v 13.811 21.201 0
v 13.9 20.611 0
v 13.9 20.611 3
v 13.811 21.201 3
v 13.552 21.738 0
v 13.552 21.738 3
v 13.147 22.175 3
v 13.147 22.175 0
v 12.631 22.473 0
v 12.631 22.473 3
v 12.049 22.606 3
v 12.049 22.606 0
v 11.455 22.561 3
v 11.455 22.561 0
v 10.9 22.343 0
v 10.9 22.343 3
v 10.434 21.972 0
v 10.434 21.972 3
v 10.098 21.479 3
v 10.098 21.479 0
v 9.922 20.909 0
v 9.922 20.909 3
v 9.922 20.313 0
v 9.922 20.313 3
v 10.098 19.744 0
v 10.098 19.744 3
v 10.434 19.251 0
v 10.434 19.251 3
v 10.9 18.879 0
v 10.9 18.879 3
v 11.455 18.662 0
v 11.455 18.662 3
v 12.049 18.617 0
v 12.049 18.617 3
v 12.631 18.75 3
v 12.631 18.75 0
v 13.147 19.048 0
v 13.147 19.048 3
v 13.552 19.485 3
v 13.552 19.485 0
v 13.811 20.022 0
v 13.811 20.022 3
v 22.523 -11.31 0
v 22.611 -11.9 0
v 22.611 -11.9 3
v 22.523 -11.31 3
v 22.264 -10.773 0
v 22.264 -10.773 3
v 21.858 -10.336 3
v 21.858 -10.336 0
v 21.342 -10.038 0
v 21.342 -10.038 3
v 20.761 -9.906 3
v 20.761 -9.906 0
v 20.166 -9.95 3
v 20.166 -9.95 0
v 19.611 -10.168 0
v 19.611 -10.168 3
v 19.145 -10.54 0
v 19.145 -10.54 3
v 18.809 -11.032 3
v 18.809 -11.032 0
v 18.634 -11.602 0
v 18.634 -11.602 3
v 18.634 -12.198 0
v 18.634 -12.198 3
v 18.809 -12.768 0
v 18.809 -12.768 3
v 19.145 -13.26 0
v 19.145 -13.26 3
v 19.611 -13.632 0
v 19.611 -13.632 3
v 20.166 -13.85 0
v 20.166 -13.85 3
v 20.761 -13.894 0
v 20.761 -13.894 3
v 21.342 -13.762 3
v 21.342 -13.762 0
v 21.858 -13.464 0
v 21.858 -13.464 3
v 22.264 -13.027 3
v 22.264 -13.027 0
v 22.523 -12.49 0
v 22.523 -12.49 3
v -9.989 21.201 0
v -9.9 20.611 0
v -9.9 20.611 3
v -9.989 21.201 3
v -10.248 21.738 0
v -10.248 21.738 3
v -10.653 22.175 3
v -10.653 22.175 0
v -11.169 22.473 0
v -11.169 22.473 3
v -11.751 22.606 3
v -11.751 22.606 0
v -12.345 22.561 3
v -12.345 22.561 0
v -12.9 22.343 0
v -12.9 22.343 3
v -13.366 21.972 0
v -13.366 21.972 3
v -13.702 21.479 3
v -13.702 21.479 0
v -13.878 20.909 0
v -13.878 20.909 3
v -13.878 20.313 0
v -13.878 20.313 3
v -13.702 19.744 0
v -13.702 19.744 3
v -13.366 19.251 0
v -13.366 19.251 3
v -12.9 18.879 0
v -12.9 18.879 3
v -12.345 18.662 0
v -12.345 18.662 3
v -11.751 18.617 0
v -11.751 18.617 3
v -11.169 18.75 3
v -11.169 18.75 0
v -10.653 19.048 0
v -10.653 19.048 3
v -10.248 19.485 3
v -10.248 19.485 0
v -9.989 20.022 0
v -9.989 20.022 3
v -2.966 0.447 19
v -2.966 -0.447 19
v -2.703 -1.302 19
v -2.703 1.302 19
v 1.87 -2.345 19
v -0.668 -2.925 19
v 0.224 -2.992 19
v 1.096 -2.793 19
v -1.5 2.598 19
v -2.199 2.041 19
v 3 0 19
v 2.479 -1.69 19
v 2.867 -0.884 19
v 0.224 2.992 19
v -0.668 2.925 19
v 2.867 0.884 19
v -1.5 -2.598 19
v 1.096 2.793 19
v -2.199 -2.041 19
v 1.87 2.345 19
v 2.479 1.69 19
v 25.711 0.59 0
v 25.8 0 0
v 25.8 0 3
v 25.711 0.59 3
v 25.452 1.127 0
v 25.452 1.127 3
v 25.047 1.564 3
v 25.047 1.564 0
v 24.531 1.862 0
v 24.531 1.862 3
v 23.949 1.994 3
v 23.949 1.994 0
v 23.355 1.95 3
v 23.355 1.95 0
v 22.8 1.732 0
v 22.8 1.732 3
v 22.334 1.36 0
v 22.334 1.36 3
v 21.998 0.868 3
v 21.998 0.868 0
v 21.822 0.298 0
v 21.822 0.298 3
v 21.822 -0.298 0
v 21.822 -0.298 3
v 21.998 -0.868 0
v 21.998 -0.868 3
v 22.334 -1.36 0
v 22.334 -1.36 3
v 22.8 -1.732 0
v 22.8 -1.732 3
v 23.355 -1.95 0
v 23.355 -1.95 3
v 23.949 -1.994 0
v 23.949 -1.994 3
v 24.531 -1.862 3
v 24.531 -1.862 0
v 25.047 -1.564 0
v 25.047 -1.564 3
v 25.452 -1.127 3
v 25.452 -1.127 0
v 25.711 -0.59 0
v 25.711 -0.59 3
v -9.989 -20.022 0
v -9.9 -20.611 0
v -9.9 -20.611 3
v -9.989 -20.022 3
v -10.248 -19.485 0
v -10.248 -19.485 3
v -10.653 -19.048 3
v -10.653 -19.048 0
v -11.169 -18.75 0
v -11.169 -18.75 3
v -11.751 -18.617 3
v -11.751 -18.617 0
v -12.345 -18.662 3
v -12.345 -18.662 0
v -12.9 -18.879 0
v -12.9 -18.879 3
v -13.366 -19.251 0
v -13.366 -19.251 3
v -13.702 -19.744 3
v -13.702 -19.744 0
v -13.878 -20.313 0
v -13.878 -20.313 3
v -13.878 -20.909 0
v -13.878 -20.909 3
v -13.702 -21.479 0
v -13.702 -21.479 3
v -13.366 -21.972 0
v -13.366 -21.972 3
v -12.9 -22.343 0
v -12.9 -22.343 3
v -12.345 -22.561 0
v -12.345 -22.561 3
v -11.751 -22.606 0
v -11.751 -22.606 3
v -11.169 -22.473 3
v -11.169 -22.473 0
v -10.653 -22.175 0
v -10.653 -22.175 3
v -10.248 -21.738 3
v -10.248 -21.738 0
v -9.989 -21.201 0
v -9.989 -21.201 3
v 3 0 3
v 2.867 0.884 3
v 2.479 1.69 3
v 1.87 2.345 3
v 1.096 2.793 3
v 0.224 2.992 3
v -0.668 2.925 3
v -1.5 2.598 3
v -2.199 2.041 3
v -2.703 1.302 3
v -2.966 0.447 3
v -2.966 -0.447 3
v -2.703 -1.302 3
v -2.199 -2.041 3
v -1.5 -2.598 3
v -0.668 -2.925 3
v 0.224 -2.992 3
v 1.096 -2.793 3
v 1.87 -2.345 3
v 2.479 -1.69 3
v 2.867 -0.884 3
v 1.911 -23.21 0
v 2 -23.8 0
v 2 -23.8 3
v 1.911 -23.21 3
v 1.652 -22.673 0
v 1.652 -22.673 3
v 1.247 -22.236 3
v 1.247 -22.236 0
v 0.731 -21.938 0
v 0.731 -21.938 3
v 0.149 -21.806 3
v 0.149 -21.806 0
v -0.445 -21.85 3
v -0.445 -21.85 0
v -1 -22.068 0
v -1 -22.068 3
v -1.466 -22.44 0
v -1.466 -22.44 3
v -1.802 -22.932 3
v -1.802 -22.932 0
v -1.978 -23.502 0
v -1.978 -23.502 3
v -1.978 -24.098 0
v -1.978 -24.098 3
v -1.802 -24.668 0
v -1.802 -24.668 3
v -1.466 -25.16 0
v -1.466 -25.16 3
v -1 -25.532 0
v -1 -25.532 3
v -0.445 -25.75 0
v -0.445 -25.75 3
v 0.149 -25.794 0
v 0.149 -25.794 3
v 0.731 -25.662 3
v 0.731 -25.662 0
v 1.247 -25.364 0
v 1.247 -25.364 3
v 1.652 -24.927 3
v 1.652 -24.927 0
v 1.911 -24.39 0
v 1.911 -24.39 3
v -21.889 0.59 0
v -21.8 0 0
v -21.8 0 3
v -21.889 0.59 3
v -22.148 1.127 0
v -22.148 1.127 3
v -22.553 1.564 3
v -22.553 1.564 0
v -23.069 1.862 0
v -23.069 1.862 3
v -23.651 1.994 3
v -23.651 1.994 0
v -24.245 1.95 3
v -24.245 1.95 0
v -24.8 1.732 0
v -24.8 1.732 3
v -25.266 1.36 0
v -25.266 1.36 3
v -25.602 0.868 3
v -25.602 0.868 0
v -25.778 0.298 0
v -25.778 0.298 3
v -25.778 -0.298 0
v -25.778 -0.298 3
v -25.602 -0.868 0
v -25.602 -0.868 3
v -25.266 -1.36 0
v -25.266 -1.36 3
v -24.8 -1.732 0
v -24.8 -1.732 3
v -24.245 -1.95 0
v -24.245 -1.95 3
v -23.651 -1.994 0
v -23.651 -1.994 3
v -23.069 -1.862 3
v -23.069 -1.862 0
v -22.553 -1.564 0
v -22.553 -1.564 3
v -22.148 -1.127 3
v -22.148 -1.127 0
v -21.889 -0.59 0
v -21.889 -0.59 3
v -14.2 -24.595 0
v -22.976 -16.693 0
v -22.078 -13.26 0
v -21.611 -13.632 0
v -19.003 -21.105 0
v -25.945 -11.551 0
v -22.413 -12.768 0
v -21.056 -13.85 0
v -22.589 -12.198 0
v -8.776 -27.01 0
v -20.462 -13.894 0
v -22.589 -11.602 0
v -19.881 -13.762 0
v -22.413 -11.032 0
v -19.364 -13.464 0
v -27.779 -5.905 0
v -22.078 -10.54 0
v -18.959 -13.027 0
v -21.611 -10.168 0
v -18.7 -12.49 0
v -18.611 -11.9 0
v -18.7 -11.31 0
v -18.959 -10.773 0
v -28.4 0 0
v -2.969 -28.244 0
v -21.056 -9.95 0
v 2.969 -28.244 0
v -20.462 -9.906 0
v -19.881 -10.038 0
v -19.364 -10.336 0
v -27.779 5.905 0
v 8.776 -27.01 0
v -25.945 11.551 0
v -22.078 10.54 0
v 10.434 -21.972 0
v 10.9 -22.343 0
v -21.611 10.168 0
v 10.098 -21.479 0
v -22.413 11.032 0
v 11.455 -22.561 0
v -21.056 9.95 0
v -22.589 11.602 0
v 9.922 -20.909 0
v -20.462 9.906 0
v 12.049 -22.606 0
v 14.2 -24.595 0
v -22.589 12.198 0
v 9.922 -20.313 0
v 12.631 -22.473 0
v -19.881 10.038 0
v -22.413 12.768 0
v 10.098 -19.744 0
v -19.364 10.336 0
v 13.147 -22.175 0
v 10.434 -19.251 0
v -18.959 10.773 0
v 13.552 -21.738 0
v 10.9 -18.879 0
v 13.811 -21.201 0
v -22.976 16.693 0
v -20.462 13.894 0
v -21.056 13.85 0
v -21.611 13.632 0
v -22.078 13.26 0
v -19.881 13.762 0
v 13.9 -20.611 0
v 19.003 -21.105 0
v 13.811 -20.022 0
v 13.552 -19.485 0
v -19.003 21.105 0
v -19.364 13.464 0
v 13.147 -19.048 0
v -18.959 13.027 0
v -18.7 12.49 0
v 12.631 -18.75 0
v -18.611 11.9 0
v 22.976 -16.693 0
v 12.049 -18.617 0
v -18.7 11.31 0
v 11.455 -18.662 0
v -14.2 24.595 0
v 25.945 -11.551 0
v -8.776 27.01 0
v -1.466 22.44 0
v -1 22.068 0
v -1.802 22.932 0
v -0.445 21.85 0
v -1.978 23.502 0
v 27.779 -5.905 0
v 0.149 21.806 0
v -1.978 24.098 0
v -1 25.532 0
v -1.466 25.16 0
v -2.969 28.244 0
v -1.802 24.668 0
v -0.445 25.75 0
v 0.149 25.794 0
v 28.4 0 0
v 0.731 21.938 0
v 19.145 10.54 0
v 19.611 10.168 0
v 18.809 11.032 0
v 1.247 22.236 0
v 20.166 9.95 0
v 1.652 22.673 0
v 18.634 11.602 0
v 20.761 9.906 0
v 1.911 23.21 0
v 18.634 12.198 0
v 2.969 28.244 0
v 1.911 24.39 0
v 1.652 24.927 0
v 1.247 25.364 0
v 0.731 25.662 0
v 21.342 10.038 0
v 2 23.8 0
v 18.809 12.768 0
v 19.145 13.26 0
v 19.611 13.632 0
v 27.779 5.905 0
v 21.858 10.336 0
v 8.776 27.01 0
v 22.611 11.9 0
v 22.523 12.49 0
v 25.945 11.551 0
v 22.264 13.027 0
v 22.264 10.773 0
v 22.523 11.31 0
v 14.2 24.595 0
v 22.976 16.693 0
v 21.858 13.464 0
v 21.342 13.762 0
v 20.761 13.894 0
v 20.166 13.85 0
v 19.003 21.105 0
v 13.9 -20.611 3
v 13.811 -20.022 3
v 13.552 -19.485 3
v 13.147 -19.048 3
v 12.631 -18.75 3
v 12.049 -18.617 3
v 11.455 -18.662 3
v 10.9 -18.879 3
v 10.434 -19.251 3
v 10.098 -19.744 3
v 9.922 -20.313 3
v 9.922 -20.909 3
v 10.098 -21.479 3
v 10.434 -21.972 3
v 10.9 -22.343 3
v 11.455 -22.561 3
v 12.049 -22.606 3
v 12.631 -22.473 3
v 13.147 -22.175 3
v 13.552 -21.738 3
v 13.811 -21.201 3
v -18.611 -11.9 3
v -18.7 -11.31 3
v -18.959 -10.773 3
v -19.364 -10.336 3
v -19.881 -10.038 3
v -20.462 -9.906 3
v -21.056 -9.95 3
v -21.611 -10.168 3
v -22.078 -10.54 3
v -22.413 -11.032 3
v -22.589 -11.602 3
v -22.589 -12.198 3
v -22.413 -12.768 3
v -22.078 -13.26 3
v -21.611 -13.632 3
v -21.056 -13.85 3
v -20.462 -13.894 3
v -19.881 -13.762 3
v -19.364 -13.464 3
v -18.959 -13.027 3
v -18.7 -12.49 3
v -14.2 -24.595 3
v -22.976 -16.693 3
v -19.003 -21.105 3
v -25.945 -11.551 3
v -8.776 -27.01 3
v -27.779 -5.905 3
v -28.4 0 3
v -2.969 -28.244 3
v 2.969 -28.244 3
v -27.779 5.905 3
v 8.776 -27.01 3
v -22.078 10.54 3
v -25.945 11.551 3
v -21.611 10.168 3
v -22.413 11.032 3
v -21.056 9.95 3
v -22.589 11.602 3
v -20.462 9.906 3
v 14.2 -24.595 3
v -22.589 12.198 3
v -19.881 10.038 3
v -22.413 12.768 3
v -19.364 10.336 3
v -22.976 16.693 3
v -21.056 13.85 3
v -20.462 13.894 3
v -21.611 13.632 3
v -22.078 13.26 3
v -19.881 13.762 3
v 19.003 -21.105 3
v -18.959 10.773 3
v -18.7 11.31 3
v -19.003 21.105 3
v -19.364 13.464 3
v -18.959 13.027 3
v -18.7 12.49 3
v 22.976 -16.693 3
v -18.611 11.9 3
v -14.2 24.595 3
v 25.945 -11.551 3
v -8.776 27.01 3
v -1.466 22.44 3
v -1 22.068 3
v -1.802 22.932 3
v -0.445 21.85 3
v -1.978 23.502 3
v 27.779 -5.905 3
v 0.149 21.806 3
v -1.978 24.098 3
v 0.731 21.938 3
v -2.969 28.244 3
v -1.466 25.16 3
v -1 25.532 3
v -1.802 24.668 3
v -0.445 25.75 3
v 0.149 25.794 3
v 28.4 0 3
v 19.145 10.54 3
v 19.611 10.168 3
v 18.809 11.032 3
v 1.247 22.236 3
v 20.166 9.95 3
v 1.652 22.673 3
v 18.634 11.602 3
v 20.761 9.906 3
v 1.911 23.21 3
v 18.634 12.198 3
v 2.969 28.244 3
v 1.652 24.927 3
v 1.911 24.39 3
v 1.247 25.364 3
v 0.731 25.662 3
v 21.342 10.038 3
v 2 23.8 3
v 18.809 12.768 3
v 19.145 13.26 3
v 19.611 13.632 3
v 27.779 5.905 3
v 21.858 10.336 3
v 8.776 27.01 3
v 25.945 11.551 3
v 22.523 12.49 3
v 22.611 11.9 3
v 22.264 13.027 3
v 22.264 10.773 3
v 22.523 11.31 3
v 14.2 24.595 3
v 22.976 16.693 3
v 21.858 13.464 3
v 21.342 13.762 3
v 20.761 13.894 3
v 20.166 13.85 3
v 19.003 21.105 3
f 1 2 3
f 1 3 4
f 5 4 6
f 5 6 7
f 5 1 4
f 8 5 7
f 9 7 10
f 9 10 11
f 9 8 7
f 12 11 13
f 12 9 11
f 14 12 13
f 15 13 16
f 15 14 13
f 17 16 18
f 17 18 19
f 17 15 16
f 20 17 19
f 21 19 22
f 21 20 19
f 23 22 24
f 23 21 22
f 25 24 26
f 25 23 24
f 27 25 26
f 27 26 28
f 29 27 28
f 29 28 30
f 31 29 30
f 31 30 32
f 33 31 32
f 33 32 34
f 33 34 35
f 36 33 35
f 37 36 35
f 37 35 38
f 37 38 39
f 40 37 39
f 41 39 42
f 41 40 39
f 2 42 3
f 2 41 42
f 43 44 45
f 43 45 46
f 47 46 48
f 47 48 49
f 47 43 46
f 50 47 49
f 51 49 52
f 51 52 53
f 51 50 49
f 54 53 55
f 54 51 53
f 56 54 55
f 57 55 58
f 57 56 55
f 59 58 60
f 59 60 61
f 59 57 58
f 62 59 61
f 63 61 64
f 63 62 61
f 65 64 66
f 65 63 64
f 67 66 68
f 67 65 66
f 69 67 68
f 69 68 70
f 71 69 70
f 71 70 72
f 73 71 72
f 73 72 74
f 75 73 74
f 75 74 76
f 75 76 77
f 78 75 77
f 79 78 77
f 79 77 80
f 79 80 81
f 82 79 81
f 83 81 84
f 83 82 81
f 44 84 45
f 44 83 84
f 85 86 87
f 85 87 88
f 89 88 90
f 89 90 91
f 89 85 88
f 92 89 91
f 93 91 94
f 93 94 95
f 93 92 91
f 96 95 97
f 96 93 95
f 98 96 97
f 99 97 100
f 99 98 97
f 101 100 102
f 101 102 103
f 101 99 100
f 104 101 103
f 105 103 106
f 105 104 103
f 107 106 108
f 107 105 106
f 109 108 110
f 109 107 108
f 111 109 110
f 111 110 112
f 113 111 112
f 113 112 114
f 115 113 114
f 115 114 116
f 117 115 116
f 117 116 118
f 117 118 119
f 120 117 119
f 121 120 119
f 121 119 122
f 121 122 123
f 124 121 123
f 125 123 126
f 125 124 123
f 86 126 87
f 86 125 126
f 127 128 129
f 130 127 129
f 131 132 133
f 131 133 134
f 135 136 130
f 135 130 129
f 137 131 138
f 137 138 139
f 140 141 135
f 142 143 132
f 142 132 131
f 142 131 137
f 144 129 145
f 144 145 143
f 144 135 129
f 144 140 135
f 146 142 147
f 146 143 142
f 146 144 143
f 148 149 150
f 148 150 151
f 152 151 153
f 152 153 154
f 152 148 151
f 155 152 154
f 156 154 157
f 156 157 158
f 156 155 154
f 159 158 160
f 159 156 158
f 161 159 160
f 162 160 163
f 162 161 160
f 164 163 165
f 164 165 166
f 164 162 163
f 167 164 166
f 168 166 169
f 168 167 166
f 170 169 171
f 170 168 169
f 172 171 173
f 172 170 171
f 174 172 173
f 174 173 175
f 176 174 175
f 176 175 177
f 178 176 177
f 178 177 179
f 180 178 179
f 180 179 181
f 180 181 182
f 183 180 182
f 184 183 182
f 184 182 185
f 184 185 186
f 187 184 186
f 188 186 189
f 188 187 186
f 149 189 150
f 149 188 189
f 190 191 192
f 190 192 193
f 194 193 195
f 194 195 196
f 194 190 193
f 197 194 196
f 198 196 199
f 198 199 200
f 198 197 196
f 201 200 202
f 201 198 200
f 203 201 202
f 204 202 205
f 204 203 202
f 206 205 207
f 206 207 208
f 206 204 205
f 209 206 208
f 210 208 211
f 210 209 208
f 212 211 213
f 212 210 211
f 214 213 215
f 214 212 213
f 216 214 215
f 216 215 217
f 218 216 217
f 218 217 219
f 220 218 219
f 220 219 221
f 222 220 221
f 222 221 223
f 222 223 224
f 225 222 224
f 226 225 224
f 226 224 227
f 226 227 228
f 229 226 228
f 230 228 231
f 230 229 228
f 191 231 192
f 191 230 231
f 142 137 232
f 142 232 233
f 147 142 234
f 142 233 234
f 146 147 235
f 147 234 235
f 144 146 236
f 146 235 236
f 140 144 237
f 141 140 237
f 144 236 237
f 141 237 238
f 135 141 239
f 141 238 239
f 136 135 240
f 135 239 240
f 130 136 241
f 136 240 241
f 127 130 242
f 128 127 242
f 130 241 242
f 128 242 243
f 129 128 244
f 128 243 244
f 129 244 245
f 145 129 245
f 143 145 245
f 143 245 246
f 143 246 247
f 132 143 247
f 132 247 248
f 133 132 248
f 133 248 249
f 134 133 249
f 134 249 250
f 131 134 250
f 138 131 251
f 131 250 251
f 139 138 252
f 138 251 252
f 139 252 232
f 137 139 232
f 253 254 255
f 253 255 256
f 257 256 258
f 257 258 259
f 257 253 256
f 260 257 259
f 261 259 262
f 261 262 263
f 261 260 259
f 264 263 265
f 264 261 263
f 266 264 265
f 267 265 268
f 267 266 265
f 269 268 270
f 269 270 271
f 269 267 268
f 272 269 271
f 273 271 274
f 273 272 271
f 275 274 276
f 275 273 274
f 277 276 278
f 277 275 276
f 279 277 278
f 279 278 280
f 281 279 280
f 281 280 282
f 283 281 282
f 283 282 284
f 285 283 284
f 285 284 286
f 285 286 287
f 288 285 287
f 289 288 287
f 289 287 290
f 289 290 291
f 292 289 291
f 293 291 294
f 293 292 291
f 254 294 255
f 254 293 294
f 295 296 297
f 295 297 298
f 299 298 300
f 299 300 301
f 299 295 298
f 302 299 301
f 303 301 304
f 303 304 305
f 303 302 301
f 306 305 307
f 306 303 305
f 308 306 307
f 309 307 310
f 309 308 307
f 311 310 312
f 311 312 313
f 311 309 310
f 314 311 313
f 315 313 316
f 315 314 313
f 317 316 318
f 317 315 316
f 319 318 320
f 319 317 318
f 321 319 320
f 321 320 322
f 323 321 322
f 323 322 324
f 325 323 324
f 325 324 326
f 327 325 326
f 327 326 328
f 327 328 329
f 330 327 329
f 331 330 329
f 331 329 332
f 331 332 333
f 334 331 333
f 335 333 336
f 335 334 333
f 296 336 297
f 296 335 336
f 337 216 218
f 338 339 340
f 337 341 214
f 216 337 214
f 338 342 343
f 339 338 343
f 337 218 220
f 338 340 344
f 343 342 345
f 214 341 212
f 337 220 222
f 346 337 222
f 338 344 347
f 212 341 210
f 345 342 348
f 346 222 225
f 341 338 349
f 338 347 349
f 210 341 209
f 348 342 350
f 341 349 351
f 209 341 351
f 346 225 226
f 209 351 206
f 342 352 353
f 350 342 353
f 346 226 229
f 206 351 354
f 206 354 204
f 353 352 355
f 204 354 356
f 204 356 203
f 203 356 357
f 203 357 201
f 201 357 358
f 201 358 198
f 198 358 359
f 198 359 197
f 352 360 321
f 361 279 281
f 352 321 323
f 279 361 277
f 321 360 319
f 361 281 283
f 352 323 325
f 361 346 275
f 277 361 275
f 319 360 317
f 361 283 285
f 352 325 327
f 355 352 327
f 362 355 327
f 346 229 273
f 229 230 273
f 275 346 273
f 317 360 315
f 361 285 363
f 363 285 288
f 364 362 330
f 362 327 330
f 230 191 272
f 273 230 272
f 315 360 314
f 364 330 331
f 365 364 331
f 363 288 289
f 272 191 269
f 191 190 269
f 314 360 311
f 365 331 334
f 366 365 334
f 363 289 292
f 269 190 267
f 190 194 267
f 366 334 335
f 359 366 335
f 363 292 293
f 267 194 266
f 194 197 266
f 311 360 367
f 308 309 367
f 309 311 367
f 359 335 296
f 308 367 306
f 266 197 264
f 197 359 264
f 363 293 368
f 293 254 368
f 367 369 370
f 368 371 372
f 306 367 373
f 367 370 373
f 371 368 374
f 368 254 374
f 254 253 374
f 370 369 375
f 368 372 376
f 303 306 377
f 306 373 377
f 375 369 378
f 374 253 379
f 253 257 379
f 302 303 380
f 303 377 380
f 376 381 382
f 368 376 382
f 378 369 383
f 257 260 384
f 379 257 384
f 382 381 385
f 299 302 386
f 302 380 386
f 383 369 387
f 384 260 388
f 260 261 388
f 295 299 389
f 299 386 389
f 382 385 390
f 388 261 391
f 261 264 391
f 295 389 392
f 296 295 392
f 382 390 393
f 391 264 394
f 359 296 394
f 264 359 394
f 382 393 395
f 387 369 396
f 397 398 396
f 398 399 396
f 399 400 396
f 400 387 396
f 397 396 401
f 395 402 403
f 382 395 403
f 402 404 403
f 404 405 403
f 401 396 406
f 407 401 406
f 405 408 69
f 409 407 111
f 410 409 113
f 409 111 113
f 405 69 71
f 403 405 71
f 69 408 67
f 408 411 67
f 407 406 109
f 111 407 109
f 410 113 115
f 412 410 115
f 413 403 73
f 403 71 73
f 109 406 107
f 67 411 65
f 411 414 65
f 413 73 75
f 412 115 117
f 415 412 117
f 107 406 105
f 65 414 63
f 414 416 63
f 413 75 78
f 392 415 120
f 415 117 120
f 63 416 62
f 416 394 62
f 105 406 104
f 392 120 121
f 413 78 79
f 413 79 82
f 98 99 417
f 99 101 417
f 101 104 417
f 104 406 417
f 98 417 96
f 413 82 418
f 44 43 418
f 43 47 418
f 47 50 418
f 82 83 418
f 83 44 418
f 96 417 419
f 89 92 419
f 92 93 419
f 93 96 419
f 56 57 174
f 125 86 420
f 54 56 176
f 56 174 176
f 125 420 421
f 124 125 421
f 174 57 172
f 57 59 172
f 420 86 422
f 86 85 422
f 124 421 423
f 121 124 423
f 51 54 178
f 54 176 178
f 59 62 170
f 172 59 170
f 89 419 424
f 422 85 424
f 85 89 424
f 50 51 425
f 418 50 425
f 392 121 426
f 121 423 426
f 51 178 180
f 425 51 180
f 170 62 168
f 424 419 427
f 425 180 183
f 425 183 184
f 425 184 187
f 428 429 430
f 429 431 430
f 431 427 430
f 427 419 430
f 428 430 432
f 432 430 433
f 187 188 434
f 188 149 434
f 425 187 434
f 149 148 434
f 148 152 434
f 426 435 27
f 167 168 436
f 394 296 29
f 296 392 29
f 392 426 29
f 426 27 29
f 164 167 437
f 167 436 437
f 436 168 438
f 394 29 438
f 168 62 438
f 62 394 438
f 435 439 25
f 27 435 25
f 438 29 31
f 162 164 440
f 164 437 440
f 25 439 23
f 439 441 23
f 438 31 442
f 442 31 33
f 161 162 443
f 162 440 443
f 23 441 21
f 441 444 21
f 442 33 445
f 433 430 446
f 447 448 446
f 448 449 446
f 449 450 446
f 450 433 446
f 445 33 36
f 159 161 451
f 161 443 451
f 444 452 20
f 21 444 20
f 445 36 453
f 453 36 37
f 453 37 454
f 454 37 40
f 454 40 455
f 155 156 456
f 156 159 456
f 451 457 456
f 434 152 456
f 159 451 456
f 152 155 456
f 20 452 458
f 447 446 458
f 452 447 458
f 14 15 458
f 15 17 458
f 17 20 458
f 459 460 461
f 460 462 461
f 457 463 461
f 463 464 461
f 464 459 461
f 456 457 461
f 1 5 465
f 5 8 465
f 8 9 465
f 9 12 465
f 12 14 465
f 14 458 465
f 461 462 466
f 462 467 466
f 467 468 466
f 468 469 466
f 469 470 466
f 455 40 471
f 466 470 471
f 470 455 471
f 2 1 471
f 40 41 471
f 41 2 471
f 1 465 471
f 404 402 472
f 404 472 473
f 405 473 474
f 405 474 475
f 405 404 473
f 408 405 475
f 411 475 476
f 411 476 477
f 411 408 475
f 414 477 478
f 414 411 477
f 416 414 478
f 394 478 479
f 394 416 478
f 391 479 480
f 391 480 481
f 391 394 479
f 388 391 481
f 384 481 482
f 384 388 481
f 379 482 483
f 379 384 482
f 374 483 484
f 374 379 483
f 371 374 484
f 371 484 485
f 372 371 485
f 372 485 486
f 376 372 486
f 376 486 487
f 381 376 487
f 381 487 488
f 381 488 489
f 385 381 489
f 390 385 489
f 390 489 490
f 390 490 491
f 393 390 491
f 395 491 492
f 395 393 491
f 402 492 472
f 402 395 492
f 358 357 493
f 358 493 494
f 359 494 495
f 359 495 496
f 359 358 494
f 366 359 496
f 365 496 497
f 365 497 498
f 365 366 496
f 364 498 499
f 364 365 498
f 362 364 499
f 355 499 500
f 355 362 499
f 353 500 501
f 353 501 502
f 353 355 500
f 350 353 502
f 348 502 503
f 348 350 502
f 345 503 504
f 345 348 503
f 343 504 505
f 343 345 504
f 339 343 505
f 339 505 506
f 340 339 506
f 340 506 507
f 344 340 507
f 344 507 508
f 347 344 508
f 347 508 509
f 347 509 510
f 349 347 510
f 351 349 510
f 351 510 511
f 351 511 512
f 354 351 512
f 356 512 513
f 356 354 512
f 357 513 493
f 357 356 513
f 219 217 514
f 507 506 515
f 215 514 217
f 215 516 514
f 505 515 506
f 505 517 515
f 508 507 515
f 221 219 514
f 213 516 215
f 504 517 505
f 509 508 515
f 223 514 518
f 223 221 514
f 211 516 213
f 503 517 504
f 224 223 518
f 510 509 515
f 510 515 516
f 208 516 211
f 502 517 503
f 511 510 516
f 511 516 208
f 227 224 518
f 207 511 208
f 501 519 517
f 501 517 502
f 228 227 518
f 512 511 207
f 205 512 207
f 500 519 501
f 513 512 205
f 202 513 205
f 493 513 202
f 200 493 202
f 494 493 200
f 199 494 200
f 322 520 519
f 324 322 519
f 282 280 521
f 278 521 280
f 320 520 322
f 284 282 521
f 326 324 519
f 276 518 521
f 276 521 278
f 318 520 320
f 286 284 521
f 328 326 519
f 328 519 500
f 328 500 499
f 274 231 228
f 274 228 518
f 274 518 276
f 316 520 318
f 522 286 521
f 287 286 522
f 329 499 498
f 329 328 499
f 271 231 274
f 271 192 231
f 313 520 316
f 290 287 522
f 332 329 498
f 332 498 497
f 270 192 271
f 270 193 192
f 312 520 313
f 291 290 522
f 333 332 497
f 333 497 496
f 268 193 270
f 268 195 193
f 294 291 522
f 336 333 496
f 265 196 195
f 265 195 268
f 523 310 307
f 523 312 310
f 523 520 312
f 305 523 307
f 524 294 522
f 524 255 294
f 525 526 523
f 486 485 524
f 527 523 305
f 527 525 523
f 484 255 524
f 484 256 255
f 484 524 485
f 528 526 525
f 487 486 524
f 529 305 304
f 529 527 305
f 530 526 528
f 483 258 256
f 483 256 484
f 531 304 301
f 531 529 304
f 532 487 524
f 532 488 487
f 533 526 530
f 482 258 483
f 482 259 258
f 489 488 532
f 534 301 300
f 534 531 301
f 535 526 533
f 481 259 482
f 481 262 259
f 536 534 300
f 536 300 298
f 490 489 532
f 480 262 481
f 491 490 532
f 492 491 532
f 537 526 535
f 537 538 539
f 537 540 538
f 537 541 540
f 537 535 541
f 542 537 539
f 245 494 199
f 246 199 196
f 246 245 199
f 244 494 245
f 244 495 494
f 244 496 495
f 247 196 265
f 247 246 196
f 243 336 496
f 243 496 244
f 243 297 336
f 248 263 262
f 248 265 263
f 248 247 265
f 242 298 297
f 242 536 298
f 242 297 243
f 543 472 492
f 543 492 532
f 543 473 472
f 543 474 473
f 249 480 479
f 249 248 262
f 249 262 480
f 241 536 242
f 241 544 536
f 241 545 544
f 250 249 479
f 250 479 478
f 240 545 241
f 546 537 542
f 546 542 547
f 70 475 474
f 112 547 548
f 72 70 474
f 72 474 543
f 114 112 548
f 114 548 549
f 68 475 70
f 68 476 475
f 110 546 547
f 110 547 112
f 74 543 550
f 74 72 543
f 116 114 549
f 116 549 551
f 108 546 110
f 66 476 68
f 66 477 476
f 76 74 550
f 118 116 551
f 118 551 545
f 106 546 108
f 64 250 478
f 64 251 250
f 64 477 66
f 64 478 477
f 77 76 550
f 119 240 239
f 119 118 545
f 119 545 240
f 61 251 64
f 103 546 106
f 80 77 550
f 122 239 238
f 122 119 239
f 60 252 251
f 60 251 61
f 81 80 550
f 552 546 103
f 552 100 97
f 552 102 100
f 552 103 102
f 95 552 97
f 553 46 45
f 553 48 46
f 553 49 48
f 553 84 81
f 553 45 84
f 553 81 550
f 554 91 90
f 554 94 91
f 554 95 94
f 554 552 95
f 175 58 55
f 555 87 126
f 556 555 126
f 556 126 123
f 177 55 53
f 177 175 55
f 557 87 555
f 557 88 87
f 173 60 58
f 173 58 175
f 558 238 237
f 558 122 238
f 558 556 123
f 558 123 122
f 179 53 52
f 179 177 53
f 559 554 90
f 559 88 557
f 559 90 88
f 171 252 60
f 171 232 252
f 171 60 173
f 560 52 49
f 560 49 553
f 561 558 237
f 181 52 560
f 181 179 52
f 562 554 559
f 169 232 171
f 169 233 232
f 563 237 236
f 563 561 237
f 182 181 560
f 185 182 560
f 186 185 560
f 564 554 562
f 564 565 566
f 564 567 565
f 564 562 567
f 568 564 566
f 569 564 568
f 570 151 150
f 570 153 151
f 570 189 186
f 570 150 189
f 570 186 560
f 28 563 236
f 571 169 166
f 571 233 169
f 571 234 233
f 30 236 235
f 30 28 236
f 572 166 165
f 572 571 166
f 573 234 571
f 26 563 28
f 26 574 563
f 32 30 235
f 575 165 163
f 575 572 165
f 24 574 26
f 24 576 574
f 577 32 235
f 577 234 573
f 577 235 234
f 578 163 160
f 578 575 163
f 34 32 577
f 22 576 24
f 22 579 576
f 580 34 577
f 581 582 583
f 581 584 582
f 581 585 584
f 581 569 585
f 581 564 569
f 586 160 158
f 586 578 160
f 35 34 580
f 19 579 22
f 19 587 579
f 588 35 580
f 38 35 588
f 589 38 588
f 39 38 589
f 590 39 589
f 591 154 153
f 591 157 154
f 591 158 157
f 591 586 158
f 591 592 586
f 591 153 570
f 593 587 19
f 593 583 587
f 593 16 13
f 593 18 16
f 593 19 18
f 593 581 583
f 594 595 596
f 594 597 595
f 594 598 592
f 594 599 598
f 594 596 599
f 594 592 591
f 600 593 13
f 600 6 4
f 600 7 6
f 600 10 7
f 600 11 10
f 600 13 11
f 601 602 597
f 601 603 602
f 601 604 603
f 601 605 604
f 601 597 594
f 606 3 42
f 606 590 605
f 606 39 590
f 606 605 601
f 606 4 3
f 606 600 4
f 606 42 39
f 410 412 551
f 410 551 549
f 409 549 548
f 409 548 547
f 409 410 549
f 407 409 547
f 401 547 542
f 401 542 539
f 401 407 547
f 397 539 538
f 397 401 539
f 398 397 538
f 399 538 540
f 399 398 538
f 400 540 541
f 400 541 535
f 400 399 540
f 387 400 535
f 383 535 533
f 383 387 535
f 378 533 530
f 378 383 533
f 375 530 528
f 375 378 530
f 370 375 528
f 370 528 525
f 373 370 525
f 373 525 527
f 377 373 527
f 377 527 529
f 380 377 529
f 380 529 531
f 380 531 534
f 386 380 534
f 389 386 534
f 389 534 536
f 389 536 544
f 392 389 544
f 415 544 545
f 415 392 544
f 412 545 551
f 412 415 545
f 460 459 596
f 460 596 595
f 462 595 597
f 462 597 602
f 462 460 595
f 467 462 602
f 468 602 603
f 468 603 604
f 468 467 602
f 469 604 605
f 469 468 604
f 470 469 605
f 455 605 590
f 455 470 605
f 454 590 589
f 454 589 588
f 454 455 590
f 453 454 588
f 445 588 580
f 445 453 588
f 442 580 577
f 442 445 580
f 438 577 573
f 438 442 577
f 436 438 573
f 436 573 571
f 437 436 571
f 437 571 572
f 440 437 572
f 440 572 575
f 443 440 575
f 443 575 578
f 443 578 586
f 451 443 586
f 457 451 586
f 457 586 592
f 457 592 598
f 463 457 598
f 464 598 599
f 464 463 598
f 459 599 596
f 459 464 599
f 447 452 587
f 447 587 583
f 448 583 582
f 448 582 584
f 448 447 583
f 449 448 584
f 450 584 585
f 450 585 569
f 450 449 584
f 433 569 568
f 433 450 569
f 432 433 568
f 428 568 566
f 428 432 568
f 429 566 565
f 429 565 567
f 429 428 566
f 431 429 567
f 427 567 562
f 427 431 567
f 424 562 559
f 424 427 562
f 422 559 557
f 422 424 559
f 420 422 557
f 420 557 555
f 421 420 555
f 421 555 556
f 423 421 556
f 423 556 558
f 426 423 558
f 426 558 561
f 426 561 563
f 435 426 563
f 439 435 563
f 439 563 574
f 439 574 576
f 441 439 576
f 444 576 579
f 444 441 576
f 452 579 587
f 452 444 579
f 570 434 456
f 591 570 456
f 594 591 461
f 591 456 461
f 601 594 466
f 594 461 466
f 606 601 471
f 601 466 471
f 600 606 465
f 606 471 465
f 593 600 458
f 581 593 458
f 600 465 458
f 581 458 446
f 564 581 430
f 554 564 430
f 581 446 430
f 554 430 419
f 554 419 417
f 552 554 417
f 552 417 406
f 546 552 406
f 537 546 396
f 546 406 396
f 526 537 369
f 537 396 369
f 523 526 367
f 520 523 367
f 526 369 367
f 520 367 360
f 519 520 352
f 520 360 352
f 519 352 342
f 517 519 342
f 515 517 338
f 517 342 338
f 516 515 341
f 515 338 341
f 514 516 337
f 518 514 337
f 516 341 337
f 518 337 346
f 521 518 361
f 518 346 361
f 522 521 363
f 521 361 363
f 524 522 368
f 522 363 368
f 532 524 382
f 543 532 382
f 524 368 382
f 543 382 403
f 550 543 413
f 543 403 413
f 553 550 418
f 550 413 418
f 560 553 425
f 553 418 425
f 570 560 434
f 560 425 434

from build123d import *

# Parameters (mm, degrees)
SKETCH1_R           = 28.4
SKETCH1_R_2         = 2
BOSS_EXTRUDE1_DEPTH = 3
SKETCH2_R           = 3
BOSS_EXTRUDE2_DEPTH = 16


with BuildPart() as part:
    # Sketch1 → Boss-Extrude1 (new body)
    with BuildSketch(Plane.XY):
        Circle(SKETCH1_R)
        with Locations((23.8, 0)):
            Circle(SKETCH1_R_2, mode=Mode.SUBTRACT)
        with Locations((20.61140461, -11.9)):
            Circle(SKETCH1_R_2, mode=Mode.SUBTRACT)
        with Locations((11.9, -20.61140461)):
            Circle(SKETCH1_R_2, mode=Mode.SUBTRACT)
        with Locations((0, -23.8)):
            Circle(SKETCH1_R_2, mode=Mode.SUBTRACT)
        with Locations((-11.9, -20.61140461)):
            Circle(SKETCH1_R_2, mode=Mode.SUBTRACT)
        with Locations((-20.61140461, -11.9)):
            Circle(SKETCH1_R_2, mode=Mode.SUBTRACT)
        with Locations((-23.8, 0)):
            Circle(SKETCH1_R_2, mode=Mode.SUBTRACT)
        with Locations((-20.61140461, 11.9)):
            Circle(SKETCH1_R_2, mode=Mode.SUBTRACT)
        with Locations((-11.9, 20.61140461)):
            Circle(SKETCH1_R_2, mode=Mode.SUBTRACT)
        with Locations((0, 23.8)):
            Circle(SKETCH1_R_2, mode=Mode.SUBTRACT)
        with Locations((11.9, 20.61140461)):
            Circle(SKETCH1_R_2, mode=Mode.SUBTRACT)
        with Locations((20.61140461, 11.9)):
            Circle(SKETCH1_R_2, mode=Mode.SUBTRACT)
    extrude(amount=BOSS_EXTRUDE1_DEPTH)

    # Sketch2 → Boss-Extrude2 (add)
    with BuildSketch(Plane.XY.offset(3)):
        Circle(SKETCH2_R)
    extrude(amount=BOSS_EXTRUDE2_DEPTH)


solid = part.part
